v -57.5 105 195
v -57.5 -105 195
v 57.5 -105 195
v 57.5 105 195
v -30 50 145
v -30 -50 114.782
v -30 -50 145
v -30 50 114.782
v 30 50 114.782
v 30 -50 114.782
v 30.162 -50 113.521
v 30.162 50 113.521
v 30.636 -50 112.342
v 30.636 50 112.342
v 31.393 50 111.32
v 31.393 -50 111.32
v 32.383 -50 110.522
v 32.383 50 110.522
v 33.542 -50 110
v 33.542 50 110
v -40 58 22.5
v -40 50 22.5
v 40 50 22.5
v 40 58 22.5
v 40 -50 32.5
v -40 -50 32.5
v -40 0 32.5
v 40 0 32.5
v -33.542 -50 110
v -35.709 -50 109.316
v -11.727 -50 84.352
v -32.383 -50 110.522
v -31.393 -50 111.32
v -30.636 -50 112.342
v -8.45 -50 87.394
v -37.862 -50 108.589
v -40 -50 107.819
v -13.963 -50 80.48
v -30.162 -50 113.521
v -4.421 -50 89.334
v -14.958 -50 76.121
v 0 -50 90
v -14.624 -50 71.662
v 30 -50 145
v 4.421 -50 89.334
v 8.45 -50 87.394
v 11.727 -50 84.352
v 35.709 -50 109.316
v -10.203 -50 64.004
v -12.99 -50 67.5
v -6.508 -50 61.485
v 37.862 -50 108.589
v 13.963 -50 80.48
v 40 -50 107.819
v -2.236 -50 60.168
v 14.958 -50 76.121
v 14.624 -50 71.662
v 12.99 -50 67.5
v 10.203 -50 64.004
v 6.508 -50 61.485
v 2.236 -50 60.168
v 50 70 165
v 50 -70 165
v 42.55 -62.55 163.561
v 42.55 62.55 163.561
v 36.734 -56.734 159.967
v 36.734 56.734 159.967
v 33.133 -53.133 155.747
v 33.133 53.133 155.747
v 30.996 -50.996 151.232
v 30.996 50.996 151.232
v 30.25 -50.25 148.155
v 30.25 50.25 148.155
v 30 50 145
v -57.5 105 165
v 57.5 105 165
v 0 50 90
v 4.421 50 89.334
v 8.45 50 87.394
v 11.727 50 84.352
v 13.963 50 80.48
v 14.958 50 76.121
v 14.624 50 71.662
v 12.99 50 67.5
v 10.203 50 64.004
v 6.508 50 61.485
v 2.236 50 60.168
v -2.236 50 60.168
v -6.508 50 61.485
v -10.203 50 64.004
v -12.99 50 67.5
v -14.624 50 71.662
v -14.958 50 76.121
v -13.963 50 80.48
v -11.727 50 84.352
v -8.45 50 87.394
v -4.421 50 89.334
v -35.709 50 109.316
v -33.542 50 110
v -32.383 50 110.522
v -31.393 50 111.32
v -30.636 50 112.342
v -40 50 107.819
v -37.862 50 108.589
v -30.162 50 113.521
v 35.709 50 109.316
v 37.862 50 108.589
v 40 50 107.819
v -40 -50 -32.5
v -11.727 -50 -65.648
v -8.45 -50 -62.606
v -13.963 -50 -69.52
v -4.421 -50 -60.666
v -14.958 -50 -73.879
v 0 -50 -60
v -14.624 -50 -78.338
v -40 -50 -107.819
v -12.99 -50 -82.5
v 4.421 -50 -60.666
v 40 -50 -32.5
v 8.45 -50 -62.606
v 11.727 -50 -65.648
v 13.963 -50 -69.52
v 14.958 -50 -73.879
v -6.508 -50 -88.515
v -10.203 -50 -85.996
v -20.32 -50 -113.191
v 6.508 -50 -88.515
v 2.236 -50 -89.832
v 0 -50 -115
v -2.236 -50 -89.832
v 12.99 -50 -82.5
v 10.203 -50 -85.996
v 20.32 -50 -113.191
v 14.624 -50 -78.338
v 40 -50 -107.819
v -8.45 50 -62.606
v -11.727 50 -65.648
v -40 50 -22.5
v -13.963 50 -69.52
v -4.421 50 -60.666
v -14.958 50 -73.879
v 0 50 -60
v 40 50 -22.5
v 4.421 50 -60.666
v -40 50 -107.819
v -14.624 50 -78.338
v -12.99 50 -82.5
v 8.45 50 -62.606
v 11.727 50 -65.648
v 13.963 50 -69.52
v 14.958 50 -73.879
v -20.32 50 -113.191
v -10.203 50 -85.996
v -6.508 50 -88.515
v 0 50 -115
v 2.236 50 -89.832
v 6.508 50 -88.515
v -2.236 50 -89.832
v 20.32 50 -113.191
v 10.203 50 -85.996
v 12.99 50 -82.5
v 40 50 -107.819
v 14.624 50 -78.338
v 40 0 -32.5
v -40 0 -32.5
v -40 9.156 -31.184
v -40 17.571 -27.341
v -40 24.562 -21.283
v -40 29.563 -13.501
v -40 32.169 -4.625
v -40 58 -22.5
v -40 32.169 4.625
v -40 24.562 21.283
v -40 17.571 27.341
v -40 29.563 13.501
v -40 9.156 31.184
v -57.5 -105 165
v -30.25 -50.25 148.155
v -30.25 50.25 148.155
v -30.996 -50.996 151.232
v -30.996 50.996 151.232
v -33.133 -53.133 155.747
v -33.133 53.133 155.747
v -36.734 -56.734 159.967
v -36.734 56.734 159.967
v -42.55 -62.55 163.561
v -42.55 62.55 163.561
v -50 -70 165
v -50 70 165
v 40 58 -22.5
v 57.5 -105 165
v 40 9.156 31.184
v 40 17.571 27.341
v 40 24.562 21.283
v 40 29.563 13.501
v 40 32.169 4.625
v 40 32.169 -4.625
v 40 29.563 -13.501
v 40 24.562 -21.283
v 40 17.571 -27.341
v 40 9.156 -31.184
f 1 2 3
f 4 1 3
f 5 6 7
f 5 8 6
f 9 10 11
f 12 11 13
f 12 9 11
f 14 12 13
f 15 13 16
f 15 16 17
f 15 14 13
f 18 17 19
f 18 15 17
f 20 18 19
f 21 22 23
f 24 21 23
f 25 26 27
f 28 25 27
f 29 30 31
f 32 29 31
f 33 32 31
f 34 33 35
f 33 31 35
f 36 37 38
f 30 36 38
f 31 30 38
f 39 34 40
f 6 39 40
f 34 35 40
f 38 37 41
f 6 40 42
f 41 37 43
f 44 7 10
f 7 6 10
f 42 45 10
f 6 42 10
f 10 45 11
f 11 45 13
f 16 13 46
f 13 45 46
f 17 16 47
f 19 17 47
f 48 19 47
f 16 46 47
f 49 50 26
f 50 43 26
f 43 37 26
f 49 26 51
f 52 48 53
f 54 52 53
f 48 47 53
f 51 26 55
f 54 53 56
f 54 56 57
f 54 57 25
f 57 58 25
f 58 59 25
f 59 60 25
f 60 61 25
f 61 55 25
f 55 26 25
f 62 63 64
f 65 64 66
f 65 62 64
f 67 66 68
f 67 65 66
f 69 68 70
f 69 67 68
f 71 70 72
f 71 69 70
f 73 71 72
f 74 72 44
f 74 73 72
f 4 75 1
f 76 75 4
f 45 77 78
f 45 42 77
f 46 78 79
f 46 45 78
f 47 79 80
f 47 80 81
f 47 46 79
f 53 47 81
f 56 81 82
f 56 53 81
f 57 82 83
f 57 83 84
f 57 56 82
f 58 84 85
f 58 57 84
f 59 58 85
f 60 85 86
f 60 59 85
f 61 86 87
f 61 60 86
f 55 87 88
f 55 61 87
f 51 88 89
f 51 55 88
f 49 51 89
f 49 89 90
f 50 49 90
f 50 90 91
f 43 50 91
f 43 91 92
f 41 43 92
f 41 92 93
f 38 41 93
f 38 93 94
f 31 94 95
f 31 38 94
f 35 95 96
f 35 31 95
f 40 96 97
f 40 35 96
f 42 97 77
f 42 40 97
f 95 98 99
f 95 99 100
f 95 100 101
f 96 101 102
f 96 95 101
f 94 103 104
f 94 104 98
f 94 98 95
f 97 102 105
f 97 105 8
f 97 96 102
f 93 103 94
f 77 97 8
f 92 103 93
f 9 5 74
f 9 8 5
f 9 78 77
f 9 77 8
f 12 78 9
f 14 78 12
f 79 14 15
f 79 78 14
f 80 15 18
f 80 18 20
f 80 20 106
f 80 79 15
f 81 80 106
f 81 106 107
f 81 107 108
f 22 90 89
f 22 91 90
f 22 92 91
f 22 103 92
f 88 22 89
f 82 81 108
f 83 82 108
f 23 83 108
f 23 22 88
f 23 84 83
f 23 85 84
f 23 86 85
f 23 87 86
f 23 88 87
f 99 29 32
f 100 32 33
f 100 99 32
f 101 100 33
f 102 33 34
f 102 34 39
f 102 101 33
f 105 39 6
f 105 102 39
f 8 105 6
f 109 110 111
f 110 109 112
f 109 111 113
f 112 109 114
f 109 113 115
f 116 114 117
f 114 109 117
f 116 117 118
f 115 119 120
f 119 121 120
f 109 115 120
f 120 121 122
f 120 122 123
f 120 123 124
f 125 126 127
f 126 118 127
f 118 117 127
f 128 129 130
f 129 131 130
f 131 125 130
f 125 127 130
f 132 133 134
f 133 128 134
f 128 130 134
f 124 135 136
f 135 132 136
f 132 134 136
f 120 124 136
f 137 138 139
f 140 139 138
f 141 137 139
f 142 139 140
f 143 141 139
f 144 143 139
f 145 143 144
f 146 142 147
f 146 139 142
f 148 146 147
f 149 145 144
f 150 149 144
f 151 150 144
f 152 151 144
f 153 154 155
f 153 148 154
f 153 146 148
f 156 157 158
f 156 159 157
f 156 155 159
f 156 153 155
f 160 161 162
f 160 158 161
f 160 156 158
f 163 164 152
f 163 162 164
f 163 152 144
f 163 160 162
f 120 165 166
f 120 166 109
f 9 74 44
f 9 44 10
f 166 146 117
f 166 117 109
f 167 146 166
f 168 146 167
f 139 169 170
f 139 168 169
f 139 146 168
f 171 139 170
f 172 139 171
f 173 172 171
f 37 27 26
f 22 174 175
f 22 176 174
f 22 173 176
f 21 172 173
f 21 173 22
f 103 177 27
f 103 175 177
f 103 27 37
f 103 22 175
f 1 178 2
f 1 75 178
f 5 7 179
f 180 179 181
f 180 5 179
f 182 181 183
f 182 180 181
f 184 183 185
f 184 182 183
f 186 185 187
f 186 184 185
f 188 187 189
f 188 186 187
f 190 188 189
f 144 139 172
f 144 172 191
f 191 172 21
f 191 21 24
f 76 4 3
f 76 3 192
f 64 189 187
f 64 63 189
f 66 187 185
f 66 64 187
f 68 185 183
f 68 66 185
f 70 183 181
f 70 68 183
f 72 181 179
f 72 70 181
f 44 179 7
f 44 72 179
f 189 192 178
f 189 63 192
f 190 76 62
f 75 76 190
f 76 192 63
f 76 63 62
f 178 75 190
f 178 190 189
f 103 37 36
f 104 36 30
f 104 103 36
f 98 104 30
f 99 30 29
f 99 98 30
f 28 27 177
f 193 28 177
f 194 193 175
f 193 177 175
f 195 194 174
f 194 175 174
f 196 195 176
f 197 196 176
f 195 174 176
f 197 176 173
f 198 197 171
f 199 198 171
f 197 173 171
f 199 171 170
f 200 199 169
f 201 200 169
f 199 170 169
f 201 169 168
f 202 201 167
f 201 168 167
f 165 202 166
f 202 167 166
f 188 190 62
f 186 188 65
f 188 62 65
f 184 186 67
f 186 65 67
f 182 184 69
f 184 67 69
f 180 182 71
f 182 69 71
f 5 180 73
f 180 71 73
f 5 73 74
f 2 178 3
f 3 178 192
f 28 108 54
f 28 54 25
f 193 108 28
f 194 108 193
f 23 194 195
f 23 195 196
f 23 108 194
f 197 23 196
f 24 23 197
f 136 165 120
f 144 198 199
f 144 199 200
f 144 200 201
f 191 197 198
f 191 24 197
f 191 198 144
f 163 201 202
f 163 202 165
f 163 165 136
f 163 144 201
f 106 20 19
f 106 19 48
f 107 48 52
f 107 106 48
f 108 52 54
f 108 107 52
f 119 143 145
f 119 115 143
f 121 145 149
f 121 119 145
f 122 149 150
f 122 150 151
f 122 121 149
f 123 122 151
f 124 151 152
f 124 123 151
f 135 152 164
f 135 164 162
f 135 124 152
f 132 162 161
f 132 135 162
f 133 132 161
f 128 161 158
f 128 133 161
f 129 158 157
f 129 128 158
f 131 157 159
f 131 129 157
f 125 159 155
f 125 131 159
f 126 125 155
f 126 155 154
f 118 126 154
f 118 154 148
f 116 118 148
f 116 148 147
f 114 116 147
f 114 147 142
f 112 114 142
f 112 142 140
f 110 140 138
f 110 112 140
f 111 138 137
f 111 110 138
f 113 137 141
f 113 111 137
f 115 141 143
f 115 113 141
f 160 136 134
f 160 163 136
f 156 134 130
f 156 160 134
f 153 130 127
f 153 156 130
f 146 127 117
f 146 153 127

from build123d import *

# Parameters (mm, degrees)
SKETCH1_R           = 15
BOSS_EXTRUDE1_DEPTH = 50
BOSS_EXTRUDE2_DEPTH = 105
SKETCH4_W           = 80
SKETCH4_H           = 45
BOSS_EXTRUDE4_DEPTH = 8
SKETCH5_W           = 80
SKETCH5_H           = 45
CUT_EXTRUDE1_DEPTH  = 8
CUT_EXTRUDE2_DEPTH  = 242.983987074
FILLET1_R           = 20


with BuildPart() as part:
    # Sketch1 → Boss-Extrude1 (new, symmetric)
    with BuildSketch(Plane(origin=(0, 0, 0), x_dir=(1, 0, 0), z_dir=(0, 1, 0))):
        with BuildLine():
            ThreePointArc((-30, -145), (-35.857864376, -159.142135624), (-50, -165))
            Line((-50, -165), (50, -165))
            ThreePointArc((50, -165), (35.857864376, -159.142135624), (30, -145))
            Line((30, -145), (30, -114.782402832))
            ThreePointArc((30, -114.782402832), (30.981812183, -111.806807654), (33.541666667, -109.999802714))
            ThreePointArc((33.541666667, -109.999802714), (36.786992802, -108.957409847), (40, -107.819293264))
            Line((40, -107.819293264), (40, 107.819293264))
            ThreePointArc((40, 107.819293264), (0, 115), (-40, 107.819293264))
            Line((-40, 107.819293264), (-40, -107.819293264))
            ThreePointArc((-40, -107.819293264), (-36.786992802, -108.957409847), (-33.541666667, -109.999802714))
            ThreePointArc((-33.541666667, -109.999802714), (-30.981812183, -111.806807654), (-30, -114.782402832))
            Line((-30, -114.782402832), (-30, -145))
        make_face()
        with Locations((0, -75)):
            Circle(SKETCH1_R, mode=Mode.SUBTRACT)
        with Locations((0, 75)):
            Circle(SKETCH1_R, mode=Mode.SUBTRACT)
    extrude(amount=BOSS_EXTRUDE1_DEPTH, both=True)

    # Sketch1<3> → Boss-Extrude2 (add, symmetric)
    with BuildSketch(Plane(origin=(0, 0, 0), x_dir=(1, 0, 0), z_dir=(0, 1, 0))):
        Polygon((-50, -165), (-57.5, -165), (-57.5, -195), (57.5, -195), (57.5, -165), (50, -165), align=None)
    extrude(amount=BOSS_EXTRUDE2_DEPTH, both=True)

    # Sketch4 → Boss-Extrude4 (add)
    with BuildSketch(Plane(origin=(0, 50, 0), x_dir=(1, 0, 0), z_dir=(0, 1, 0))):
        Rectangle(SKETCH4_W, SKETCH4_H)
    extrude(amount=BOSS_EXTRUDE4_DEPTH)

    # Sketch5 → Cut-Extrude1 (cut)
    with BuildSketch(Plane.XZ.offset(50)):
        Rectangle(SKETCH5_W, SKETCH5_H)
    extrude(amount=-CUT_EXTRUDE1_DEPTH, mode=Mode.SUBTRACT)

    # Sketch6 → Cut-Extrude2 (cut, through all)
    with BuildSketch(Plane.ZY.offset(40)):
        with BuildLine():
            Line((-32.5, 0), (-32.5, -50))
            Line((-32.5, -50), (32.5, -50))
            Line((32.5, -50), (32.5, 0))
            ThreePointArc((32.5, 0), (0, 32.5), (-32.5, 0))
        make_face()
    extrude(amount=-CUT_EXTRUDE2_DEPTH, mode=Mode.SUBTRACT)

    # Fillet1
    fillet1_edges = [part.edges().sort_by_distance(p)[0] for p in [
        (0, 50, 165),
        (0, -50, 165),
    ]]
    fillet(fillet1_edges, radius=FILLET1_R)


solid = part.part
